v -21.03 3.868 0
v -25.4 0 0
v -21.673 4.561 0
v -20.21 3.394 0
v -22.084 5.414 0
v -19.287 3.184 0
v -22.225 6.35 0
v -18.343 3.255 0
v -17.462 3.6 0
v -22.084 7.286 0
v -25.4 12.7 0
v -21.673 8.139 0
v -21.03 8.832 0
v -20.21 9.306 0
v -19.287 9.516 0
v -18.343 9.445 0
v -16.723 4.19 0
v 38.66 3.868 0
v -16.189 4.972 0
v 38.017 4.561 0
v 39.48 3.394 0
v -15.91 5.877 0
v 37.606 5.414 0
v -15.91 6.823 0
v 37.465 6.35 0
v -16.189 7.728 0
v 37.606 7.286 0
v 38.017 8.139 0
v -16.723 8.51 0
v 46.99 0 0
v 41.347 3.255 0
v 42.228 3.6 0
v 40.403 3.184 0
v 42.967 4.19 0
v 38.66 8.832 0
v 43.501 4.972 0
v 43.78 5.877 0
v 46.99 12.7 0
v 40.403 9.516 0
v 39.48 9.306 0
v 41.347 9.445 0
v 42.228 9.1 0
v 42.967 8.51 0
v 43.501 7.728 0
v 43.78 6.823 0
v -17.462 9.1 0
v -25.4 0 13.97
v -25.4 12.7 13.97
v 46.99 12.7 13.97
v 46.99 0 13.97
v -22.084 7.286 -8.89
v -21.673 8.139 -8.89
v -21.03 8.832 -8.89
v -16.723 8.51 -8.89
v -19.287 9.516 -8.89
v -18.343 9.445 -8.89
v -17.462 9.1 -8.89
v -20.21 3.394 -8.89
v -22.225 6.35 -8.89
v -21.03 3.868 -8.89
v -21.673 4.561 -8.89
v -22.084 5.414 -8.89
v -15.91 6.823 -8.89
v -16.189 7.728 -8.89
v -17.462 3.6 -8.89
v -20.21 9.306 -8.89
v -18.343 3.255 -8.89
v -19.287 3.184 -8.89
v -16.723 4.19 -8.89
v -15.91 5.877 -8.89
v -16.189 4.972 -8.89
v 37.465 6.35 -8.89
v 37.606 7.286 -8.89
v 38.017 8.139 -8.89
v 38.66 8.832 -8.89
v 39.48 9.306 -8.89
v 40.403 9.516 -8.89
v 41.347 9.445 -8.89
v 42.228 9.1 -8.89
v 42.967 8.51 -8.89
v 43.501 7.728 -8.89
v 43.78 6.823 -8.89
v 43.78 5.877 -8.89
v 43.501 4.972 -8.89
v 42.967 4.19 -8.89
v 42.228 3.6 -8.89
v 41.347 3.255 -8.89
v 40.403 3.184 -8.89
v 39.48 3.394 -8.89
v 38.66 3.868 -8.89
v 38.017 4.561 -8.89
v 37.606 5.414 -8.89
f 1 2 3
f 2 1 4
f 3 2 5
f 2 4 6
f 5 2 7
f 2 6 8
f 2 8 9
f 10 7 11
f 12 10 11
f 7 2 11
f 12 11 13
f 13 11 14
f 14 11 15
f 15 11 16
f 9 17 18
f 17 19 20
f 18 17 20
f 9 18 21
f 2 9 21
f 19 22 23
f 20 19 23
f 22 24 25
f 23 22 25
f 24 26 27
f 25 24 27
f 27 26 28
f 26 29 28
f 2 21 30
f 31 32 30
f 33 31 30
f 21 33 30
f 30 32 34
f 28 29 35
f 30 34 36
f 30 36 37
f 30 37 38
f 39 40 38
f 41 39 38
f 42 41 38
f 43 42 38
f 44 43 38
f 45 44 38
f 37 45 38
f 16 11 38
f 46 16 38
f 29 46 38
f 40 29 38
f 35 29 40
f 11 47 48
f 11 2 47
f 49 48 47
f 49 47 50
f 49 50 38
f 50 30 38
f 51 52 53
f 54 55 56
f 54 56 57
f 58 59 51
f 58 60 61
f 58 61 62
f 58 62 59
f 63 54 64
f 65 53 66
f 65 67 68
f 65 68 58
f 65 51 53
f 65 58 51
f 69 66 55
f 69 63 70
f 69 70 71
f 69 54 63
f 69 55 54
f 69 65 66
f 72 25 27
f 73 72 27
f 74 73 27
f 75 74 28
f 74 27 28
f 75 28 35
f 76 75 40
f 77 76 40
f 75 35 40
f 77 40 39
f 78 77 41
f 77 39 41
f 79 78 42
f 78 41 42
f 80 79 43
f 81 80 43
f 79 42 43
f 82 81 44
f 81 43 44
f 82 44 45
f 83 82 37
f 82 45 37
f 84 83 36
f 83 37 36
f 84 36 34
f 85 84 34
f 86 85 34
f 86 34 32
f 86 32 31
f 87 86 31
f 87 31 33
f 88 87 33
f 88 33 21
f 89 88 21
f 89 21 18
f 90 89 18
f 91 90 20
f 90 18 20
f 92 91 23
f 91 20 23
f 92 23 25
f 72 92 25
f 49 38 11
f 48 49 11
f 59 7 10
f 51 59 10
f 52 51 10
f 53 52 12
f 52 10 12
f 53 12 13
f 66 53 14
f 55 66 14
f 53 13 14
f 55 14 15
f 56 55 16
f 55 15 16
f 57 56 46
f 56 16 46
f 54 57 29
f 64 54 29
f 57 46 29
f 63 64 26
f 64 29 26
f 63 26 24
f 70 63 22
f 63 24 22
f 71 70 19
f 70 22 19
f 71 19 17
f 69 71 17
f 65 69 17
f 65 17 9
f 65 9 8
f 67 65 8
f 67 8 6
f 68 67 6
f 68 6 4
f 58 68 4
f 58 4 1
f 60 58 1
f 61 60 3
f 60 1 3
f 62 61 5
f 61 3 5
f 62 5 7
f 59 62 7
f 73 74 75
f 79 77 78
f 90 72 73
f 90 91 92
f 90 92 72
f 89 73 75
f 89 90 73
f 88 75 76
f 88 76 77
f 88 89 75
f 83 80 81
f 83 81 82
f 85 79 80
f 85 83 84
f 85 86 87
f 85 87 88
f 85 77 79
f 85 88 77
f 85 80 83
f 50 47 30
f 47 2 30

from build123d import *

# Parameters (mm, degrees)
F0_W     = 25.4
F0_H     = 12.7
F0_W_2   = 46.99
F1_DEPTH = 7.62
F3_DEPTH = 8.89
F4_DEPTH = 6.35


with BuildPart() as f1:
    # F0 (on Top) → F1 (new body)
    with BuildSketch(Plane.XY):
        with Locations((-12.7, 6.35)):
            Rectangle(F0_W, F0_H)
        with Locations((23.495, 6.35)):
            Rectangle(F0_W_2, F0_H)
    extrude(amount=F1_DEPTH)

    # F2 (on face) → F3 (join)
    with BuildSketch(Plane(origin=(0, 0, 0), x_dir=(1, 0, 0), z_dir=(0, 0, -1))):
        with BuildLine():
            ThreePointArc((-15.875, -6.35), (-19.05, -3.175), (-22.225, -6.35))
            Line((-22.225, -6.35), (-19.05, -6.35))
            Line((-19.05, -6.35), (-15.875, -6.35))
        make_face()
        with BuildLine():
            Line((-19.05, -6.35), (-22.225, -6.35))
            ThreePointArc((-22.225, -6.35), (-19.05, -9.525), (-15.875, -6.35))
            Line((-15.875, -6.35), (-19.05, -6.35))
        make_face()
        with BuildLine():
            Line((40.64, -6.35), (43.815, -6.35))
            ThreePointArc((43.815, -6.35), (40.64, -3.175), (37.465, -6.35))
            Line((37.465, -6.35), (40.64, -6.35))
        make_face()
        with BuildLine():
            ThreePointArc((37.465, -6.35), (40.64, -9.525), (43.815, -6.35))
            Line((43.815, -6.35), (40.64, -6.35))
            Line((40.64, -6.35), (37.465, -6.35))
        make_face()
    extrude(amount=F3_DEPTH)

    # F4 (add): a face of the model
    f4_faces = [f1.faces().sort_by_distance(p)[0] for p in [
        (10.795, 6.35, 7.62),
    ]]
    extrude(f4_faces, amount=F4_DEPTH)


solid = f1.part
